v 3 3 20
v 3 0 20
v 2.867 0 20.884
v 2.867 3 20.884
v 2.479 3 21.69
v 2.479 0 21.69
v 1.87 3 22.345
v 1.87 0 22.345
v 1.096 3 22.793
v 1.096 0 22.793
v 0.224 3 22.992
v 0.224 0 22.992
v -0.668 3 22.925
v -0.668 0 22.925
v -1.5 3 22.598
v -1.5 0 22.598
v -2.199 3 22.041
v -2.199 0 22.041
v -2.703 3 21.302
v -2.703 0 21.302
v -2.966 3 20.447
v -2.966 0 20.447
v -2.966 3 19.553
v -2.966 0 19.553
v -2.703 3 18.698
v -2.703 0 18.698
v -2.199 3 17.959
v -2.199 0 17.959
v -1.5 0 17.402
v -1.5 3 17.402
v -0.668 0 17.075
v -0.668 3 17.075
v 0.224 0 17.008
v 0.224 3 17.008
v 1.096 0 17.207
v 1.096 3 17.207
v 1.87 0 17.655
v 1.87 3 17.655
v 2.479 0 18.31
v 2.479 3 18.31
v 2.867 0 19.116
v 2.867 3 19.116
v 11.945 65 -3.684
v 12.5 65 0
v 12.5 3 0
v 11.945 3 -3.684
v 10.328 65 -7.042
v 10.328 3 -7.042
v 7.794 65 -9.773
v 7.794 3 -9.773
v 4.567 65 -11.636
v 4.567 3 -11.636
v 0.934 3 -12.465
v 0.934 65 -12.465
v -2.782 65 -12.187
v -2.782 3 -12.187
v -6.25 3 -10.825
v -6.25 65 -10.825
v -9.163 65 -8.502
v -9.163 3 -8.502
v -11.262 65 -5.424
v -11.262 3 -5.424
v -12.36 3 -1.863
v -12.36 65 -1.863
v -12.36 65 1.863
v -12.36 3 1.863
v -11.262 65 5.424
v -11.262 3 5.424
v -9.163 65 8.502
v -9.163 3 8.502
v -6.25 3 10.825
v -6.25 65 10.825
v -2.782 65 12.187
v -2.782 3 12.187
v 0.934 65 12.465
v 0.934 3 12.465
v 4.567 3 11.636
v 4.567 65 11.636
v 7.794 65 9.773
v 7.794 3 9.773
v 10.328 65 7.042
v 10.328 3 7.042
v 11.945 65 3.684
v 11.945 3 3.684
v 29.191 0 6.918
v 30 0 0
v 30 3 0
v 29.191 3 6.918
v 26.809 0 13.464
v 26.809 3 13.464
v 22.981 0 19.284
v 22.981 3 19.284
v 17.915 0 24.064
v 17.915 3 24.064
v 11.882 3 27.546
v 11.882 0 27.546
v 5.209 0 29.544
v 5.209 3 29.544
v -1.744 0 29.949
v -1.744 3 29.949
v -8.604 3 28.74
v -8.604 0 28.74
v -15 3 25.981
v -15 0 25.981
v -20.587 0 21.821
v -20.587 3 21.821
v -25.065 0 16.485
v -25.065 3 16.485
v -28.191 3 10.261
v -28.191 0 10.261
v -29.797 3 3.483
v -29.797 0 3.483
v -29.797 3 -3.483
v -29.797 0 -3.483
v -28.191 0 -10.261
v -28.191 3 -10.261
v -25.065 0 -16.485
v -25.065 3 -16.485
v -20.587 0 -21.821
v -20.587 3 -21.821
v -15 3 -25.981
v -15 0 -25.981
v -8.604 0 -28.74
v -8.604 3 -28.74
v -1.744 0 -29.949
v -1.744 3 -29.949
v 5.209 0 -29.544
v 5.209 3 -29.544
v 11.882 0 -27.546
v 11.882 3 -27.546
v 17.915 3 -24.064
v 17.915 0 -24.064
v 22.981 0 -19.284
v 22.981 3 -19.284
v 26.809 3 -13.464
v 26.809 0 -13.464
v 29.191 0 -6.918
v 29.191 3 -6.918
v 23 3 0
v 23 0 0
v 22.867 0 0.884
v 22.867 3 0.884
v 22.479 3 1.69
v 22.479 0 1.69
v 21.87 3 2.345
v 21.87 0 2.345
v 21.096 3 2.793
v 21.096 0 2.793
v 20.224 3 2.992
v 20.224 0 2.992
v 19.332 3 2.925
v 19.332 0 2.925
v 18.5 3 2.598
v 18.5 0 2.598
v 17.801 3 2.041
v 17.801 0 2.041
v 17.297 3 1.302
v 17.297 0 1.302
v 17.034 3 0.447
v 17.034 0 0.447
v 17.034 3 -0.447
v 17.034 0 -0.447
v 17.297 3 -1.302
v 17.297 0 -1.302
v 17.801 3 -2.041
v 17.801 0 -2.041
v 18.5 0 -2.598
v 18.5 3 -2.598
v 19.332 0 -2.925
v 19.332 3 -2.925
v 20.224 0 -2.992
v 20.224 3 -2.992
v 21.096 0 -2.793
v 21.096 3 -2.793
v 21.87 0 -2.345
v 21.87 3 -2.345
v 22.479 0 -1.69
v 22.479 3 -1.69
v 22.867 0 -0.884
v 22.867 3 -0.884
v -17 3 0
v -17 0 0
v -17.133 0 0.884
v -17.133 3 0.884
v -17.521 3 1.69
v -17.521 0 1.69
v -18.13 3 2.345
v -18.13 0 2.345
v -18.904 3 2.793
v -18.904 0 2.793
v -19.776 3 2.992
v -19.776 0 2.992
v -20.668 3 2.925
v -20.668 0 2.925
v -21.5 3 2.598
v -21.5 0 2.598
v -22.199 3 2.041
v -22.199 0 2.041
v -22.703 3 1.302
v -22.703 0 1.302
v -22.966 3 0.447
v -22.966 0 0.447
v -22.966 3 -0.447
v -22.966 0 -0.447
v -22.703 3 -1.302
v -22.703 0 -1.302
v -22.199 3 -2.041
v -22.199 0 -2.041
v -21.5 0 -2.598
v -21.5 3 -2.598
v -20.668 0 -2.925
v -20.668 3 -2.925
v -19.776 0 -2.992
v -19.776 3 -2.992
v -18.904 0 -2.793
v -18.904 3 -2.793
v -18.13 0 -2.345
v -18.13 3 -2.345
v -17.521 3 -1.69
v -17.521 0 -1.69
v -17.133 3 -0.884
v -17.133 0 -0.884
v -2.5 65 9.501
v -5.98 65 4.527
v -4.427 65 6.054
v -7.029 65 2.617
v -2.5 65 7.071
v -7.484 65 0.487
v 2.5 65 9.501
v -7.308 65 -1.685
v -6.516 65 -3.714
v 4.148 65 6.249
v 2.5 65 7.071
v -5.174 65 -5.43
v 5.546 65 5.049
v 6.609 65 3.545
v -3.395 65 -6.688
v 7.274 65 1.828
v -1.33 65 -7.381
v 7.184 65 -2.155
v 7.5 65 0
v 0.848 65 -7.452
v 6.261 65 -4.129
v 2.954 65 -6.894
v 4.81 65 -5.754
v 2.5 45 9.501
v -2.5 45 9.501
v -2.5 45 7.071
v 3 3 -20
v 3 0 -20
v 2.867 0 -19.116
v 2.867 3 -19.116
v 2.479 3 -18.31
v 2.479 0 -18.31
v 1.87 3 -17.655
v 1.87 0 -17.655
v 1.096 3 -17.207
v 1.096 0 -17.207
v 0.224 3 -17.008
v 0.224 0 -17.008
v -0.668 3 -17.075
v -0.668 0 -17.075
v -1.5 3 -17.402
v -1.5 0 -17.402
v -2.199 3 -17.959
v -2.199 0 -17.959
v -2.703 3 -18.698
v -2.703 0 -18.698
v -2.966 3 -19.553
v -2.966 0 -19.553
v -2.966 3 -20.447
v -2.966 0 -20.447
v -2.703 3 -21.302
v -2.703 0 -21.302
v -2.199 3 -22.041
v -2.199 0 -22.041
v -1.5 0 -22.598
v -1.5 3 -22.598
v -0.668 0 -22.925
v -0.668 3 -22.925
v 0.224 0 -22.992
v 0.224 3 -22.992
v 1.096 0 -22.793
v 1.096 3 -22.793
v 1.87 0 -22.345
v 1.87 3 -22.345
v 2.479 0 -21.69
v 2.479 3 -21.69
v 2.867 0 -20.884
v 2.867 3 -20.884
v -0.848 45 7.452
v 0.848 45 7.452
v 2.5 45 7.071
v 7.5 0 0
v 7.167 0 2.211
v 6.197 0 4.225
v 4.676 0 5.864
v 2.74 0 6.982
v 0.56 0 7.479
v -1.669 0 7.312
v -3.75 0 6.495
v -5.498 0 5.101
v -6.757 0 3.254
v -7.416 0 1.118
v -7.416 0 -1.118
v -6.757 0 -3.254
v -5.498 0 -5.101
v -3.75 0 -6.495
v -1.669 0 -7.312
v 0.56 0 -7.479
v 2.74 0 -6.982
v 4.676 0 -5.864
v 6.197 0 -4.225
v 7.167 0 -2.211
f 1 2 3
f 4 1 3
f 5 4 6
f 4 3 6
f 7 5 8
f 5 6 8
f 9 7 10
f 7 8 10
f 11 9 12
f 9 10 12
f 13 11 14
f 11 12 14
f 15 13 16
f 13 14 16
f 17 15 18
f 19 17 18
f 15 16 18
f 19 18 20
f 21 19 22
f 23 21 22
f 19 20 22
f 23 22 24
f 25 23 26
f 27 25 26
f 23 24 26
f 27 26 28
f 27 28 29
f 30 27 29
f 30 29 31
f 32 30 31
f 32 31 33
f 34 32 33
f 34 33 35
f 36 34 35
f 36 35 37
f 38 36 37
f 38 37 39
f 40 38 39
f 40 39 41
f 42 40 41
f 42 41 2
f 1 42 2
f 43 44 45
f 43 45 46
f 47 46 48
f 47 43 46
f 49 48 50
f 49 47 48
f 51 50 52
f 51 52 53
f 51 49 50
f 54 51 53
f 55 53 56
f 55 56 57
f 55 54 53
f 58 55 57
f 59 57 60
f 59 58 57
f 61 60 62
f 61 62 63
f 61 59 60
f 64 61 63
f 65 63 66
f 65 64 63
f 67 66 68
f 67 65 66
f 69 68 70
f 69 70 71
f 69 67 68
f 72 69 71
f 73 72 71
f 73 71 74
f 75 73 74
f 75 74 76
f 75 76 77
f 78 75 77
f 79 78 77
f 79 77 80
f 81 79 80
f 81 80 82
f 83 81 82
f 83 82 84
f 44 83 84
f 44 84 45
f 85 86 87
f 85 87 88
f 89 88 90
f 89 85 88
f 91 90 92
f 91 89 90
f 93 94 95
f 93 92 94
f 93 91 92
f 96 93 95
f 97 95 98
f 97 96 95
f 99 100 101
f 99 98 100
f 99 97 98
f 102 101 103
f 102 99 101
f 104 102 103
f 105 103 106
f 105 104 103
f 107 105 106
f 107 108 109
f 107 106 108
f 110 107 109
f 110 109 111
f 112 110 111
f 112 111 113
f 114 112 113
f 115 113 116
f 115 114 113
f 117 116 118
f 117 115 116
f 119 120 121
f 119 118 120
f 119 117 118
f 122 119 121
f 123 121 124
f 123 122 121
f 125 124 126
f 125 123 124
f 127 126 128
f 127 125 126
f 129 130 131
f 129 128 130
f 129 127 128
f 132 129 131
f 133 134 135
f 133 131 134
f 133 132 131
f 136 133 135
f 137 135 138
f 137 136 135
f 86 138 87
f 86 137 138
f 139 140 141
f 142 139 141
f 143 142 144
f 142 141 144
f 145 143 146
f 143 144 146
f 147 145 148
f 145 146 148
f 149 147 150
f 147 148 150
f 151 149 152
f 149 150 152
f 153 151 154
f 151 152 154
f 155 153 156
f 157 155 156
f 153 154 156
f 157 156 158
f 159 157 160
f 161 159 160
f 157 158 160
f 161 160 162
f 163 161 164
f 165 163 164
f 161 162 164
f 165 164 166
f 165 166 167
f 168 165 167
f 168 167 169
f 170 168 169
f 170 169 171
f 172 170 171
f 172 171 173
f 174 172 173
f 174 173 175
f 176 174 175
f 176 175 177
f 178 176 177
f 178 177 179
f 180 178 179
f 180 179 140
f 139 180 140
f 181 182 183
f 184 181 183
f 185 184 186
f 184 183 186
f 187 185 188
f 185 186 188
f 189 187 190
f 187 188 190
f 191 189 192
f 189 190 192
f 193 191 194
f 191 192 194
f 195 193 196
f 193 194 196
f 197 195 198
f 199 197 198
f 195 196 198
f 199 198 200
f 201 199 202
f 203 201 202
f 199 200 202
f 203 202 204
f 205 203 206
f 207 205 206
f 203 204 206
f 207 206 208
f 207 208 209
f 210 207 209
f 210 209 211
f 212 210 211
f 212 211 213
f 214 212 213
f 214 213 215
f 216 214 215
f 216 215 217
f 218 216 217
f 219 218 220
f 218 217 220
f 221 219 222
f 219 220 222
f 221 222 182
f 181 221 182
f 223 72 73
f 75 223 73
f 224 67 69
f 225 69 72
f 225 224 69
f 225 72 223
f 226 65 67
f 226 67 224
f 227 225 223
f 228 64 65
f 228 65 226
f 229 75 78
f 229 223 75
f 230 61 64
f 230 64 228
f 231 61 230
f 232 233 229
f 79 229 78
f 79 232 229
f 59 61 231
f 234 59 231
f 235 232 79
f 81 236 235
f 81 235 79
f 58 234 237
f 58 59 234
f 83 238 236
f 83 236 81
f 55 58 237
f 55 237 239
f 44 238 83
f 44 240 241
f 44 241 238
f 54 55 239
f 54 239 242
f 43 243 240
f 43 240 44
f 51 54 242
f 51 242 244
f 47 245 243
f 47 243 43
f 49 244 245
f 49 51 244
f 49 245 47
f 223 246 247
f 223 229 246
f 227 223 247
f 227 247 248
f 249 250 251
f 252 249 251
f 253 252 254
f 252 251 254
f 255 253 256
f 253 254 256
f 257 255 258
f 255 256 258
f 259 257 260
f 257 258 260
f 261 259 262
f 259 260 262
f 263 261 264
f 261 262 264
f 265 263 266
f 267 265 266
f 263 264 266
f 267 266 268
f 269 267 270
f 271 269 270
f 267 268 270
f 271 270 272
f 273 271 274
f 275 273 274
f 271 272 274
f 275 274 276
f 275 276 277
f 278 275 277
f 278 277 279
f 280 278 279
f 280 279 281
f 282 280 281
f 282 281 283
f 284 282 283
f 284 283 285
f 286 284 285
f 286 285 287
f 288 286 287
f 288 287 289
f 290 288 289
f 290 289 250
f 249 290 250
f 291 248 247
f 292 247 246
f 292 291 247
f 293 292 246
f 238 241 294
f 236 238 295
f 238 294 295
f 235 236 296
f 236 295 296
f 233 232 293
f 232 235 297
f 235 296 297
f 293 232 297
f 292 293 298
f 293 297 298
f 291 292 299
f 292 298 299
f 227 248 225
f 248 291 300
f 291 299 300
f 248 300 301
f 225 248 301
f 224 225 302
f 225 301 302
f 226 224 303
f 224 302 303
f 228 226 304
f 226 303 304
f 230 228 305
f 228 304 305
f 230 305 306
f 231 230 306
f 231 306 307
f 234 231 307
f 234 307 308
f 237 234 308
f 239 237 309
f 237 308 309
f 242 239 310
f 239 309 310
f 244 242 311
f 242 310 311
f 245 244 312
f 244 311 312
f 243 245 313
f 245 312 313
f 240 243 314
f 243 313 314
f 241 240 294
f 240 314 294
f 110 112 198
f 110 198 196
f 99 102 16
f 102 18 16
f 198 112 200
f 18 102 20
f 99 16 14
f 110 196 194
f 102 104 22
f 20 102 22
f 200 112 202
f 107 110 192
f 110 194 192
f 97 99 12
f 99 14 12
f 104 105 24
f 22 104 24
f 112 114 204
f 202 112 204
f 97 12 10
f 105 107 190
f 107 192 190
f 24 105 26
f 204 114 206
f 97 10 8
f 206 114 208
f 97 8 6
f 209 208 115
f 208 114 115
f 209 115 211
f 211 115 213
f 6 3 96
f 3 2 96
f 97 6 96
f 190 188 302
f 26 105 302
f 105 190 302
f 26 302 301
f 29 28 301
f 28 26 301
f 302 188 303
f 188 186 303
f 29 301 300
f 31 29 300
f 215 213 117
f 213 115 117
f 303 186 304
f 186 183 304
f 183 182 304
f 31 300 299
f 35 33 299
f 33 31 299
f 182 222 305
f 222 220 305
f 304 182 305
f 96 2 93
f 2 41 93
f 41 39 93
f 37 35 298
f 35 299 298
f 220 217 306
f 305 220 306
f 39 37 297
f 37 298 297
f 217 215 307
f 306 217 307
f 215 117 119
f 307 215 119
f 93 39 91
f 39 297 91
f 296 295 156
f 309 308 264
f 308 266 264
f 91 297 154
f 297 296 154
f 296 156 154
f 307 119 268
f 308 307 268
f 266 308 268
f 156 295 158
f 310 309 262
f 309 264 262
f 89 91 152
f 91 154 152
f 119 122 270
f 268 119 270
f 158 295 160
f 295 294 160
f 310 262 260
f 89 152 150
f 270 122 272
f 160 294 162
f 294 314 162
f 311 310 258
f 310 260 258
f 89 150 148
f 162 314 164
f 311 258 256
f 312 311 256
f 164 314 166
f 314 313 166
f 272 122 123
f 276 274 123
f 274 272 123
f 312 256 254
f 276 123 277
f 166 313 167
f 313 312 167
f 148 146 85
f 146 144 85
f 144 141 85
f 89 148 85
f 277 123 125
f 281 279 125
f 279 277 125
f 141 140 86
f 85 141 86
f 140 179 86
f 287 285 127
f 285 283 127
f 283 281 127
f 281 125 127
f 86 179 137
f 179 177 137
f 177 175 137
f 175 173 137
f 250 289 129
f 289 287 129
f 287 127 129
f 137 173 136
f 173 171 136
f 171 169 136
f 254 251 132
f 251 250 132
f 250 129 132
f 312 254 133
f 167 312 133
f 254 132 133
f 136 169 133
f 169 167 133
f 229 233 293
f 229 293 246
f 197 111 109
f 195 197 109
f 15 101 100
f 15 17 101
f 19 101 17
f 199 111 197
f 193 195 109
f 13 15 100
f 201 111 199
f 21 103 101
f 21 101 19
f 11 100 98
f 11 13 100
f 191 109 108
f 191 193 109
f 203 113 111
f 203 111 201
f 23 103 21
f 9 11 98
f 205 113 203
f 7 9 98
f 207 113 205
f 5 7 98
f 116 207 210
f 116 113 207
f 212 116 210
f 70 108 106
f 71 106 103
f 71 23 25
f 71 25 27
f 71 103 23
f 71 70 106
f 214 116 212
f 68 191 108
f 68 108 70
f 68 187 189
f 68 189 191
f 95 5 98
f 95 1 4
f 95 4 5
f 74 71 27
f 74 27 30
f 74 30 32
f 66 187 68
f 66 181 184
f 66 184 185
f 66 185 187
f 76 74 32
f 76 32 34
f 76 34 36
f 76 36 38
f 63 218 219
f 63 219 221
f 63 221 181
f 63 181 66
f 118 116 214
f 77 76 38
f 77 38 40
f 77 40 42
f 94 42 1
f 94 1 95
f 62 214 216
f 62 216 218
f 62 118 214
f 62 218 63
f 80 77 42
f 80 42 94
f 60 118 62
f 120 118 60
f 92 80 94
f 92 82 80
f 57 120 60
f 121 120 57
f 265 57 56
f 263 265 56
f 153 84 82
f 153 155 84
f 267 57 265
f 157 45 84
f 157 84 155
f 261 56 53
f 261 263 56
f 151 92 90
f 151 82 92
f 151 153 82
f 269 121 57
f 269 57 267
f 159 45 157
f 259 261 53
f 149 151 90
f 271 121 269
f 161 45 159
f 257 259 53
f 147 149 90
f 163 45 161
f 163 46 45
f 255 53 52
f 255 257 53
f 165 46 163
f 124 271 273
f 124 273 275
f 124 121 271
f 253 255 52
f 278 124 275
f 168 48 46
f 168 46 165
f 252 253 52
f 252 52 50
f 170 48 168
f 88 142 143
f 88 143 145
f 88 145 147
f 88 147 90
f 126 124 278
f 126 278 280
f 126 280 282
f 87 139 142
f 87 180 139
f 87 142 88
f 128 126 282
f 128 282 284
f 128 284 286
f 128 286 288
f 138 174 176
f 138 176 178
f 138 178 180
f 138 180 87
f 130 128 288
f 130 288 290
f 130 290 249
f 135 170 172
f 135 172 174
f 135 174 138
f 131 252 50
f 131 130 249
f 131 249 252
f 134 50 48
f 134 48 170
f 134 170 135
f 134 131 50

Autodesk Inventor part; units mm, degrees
ref_plane "YZ Plane" through (0, 0, 0) normal (1, 0, 0) x (0, 1, 0)
ref_plane "XZ Plane" through (0, 0, 0) normal (0, 1, 0) x (-1, 0, 0)
ref_plane "XY Plane" through (0, 0, 0) normal (0, 0, 1) x (1, 0, 0)
sketch "スケッチ1" plane through (0, 0, 0) normal (0, 0, 1) x (1, 0, 0)
  line L0 (-6, 0) -> (36, 0) projected
  line L1 (0, -13) -> (0, 78) projected
  line L2 (7.5, 0) -> (30, 0)
  line L3 (30, 3) -> (12.5, 3)
  line L4 (12.5, 3) -> (12.5, 65)
  line L5 (12.5, 65) -> (7.5, 65)
  line L6 (7.5, 65) -> (7.5, 0)
  line L7 (30, 3) -> (30, 0)
  point P0 (0, 0)
  dimension "d0" = 7.5
  dimension "d1" = 5
  dimension "d2" = 30
  dimension "d3" = 65
  dimension "d4" = 3
revolve "回転1" add sketch "スケッチ1" angle 360 about axis through (0, -10, 0) along (0, 1, 0)
sketch "スケッチ2" plane through (0, 0, 0) normal (0, -1, 0) x (1, 0, 0)
  circle A0 centre (0, 0) radius 20
  line L0 (-42, 0) -> (42, 0) projected
  line L1 (0, -42) -> (0, 42) projected
  circle A1 centre (20, 0) radius 3
  circle A2 centre (0, 20) radius 3
  circle A3 centre (-20, 0) radius 3
  circle A4 centre (0, -20) radius 3
  dimension "d6" = 40
  dimension "d7" = 6
  dimension "d10" = 360
extrude "押し出し1" cut sketch "スケッチ2" against normal blind 10 contours L0 A1 A0 | L0 A1 A0 | A0 A1 L0 | A0 A1 L0 | A2 L1 A0 | A0 L1 A2 | A4 L1 A0 | A0 L1 A4 | L1 A2 A0 | A0 A2 L1 | L1 A4 A0 | A0 A4 L1 | A3 A0 L0 | L0 A0 A3 | L0 A3 A0 | A0 A3 L0
sketch "スケッチ3" plane through (0, 65, 0) normal (0, 1, 0) x (1, 0, 0)
  line L0 (0, 42) -> (0, -42) projected
  line L1 (-42, 0) -> (42, 0) projected
  circle A0 centre (0, 0) radius 7.5 projected
  line L2 (2.5, -9.5011) -> (-2.5, -9.5011)
  line L3 (-2.5, -9.5011) -> (-2.5, -7.0711)
  line L4 (2.5, -7.0711) -> (2.5, -9.5011)
  line L5 (2.5, -9.5011) -> (-2.5, -7.0711) construction
  line L6 (-2.5, -9.5011) -> (2.5, -7.0711) construction
  circle A1 centre (0, 0) radius 12.5 projected
  circle A2 centre (0, 0) radius 7.5 projected
  circle A3 centre (0, 0) radius 7.5 projected
  arc A4 (-2.5, -7.0711) -> (2.5, -7.0711) centre (0, 0) ccw
  point P0 (0, -8.2861)
  dimension "d15" = 5
  dimension "d17" = 2.43
extrude "押し出し2" cut sketch "スケッチ3" against normal blind 20 contours A0 L4 L2 L0 | L0 L2 L3 A0
properties part number "Hub_v4" material "アルミニウム 6061"
